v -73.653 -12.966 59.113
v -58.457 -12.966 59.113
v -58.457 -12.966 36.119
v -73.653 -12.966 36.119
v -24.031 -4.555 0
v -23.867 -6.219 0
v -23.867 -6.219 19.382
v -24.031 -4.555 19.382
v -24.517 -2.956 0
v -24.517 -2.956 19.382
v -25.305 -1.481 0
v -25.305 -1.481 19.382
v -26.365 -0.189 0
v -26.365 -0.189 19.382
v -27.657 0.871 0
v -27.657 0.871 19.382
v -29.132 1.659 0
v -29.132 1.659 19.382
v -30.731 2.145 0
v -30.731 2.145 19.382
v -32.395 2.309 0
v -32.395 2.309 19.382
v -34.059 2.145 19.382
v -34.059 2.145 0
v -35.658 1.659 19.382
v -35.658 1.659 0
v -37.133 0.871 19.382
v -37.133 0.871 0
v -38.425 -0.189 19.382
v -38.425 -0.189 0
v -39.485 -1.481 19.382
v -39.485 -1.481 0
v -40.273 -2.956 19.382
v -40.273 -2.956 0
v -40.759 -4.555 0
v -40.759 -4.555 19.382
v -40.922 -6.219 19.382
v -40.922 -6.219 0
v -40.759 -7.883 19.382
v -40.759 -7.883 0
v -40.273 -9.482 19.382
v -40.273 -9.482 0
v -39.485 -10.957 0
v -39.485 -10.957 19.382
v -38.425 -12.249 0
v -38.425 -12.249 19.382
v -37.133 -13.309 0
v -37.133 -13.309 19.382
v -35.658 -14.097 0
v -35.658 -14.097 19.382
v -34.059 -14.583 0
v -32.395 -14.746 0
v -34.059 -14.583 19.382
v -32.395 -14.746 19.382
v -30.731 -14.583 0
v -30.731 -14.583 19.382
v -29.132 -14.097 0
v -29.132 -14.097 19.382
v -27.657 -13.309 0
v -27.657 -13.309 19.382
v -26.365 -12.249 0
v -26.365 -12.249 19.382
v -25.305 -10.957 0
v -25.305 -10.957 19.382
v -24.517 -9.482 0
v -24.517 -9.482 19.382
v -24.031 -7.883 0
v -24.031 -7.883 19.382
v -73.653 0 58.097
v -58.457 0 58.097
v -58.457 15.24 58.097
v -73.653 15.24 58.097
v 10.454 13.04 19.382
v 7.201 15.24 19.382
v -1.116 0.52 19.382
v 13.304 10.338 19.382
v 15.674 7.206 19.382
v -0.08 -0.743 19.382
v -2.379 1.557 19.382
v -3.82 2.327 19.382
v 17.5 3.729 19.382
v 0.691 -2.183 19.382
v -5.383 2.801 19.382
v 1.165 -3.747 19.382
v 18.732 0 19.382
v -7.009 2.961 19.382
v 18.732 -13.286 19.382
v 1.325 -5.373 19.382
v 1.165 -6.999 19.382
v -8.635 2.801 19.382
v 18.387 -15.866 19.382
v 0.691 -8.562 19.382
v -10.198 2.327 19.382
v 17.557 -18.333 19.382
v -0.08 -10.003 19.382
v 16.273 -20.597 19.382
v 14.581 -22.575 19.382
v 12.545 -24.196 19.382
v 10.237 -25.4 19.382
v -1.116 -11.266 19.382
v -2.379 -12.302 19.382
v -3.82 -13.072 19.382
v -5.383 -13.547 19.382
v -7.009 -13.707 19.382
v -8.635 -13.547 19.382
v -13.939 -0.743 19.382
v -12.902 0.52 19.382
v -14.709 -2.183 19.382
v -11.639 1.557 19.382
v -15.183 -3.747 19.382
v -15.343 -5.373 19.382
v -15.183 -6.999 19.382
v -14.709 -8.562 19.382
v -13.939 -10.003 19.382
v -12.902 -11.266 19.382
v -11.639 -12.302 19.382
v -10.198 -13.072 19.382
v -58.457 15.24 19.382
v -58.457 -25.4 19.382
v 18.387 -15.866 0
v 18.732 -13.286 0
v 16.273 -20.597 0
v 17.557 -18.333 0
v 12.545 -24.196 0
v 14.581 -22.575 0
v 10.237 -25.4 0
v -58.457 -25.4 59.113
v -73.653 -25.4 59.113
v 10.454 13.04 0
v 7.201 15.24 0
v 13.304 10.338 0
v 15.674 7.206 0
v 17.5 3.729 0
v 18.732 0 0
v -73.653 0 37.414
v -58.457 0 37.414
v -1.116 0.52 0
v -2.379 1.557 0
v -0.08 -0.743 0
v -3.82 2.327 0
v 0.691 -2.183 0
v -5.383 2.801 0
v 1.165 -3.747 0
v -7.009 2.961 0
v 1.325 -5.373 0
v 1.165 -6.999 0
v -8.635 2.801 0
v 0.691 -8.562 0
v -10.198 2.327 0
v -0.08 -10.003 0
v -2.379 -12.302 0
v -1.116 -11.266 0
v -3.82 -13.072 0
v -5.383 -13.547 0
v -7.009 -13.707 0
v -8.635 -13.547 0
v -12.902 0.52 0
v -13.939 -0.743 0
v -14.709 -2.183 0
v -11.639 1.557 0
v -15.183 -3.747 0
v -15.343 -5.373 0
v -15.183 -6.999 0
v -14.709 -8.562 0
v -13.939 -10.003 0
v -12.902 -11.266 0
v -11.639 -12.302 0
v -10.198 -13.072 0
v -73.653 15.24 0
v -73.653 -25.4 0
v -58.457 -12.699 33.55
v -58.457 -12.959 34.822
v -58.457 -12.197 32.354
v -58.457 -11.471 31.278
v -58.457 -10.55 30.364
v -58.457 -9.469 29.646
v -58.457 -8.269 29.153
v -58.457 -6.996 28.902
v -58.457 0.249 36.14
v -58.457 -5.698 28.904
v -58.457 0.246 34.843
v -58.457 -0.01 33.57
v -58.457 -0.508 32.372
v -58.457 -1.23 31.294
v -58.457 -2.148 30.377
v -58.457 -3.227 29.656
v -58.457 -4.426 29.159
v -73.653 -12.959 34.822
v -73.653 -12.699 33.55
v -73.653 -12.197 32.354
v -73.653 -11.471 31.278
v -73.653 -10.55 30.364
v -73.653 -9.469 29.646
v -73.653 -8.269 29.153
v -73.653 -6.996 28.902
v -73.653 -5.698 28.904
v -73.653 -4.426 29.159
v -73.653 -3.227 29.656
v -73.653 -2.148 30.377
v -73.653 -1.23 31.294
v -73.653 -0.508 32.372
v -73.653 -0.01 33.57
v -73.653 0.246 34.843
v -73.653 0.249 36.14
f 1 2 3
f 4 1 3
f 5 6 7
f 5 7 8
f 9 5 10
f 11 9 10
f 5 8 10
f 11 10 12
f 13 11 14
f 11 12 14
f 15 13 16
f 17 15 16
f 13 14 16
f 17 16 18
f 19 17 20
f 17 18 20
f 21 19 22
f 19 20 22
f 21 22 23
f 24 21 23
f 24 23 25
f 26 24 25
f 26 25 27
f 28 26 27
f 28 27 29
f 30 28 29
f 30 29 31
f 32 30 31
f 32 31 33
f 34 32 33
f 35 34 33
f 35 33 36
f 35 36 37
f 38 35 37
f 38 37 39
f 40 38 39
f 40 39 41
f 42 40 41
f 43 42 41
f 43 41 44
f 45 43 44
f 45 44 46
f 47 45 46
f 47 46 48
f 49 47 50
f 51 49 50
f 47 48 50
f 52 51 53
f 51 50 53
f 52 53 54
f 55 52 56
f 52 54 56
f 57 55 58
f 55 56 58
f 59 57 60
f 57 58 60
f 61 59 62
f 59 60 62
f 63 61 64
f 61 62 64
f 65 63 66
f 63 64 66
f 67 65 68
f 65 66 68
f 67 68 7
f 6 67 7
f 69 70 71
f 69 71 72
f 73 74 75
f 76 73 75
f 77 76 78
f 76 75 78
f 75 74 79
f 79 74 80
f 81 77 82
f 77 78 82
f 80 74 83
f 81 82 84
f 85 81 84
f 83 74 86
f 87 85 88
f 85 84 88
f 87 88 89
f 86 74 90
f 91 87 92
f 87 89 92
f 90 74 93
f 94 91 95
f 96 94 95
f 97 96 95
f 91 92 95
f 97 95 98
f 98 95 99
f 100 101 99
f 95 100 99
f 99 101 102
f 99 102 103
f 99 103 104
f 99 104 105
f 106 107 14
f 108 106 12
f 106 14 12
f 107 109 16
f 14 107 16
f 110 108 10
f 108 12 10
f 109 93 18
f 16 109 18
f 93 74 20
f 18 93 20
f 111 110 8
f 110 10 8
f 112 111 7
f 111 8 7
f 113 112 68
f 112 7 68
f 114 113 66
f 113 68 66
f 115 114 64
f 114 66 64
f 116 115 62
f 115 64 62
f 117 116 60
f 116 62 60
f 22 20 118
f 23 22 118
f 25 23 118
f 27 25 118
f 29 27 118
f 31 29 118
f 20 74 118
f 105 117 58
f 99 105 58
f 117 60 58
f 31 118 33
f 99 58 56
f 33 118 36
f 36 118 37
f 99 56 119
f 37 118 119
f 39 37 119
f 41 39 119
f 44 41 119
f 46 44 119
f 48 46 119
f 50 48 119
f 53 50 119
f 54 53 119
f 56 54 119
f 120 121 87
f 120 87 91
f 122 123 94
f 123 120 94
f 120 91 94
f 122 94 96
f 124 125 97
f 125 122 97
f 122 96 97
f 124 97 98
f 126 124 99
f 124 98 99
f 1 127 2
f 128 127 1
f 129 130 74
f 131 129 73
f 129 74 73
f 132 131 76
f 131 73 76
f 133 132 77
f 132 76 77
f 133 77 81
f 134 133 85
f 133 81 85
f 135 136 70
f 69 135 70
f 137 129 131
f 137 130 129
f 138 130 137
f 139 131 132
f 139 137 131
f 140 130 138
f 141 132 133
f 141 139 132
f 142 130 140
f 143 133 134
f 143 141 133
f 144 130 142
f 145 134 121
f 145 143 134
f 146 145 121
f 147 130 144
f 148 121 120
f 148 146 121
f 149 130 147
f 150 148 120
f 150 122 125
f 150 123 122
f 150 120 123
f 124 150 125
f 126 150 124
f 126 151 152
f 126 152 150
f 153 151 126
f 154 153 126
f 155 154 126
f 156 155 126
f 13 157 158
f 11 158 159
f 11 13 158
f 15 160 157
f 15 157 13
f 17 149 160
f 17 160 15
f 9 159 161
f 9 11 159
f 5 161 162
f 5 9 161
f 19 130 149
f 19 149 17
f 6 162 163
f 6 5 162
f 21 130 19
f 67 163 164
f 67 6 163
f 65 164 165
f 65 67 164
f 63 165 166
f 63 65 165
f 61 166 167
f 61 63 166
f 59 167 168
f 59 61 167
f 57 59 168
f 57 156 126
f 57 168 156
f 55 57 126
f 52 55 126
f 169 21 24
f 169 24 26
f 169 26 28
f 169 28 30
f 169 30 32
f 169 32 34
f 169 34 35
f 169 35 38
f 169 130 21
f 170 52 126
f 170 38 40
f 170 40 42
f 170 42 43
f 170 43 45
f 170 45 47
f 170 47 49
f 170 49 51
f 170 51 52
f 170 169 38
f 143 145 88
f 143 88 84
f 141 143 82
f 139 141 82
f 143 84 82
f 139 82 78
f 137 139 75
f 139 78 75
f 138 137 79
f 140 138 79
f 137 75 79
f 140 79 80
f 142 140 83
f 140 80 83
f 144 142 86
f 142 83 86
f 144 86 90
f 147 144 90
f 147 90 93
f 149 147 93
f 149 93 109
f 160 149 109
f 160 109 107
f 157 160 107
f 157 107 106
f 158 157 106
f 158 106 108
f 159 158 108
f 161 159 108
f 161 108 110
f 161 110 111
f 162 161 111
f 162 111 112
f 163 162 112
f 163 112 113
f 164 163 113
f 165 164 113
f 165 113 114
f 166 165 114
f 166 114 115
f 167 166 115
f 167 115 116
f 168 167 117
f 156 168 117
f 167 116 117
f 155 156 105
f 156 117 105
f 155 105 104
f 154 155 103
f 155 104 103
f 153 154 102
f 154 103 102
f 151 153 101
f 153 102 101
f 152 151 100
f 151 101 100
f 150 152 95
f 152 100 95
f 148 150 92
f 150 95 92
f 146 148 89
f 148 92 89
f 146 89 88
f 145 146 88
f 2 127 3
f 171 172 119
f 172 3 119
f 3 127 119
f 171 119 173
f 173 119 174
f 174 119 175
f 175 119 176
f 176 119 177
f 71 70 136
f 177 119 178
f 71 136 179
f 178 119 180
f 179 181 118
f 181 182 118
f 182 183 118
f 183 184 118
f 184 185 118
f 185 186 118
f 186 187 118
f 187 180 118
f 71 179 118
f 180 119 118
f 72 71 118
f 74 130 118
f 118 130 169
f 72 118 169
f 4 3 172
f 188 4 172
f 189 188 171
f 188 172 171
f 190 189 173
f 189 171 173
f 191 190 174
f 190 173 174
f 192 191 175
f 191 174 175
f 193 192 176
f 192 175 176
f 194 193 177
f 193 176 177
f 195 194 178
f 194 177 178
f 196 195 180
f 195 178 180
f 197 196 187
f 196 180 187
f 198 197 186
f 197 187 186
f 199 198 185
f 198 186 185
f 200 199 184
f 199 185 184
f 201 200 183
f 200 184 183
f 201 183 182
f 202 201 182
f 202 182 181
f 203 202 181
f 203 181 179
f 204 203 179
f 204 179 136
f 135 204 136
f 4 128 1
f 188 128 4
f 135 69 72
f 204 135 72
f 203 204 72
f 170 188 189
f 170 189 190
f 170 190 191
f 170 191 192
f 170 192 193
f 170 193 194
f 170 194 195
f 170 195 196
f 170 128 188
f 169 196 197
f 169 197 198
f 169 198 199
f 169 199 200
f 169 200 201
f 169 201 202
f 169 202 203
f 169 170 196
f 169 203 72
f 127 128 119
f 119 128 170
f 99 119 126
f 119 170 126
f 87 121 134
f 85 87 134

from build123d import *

# Parameters (mm, degrees)
F1_DEPTH  = 25.4
F2_DEPTH  = 15.24
F3_DEPTH  = 25.4
F4_DEPTH  = 10.414
F5_R      = 8.5275246161
F5_R_2    = 8.3340687874
F6_DEPTH  = 25.4
F7_R      = 6.6367792204
F8_DEPTH  = 25.4
F10_DEPTH = 63.246
F12_DEPTH = 25.4
F14_DEPTH = 25.4
F15_DEPTH = 72.644
F16_DEPTH = 3.556
F17_DEPTH = 4.572


with BuildPart() as f1:
    # F0 (on Front) → F1 (new body)
    with BuildSketch(Plane.XZ):
        Polygon((-73.6526176333, 52.2545948625), (-73.6526176333, 0), (-6.6675012931, 0), (-6.6675012931, 19.3822681904), (-58.4569200873, 19.3822681904), (-58.4569200873, 52.2545948625), align=None)
    extrude(amount=F1_DEPTH)

    # F2 (add): a face of the model
    f2_faces = [f1.faces().sort_by_distance(p)[0] for p in [
        (-47.3547272267, 0, 16.950424852),
    ]]
    extrude(f2_faces, amount=F2_DEPTH)

    # F3 (add): a face of the model
    f3_faces = [f1.faces().sort_by_distance(p)[0] for p in [
        (-6.6675012931, -5.08, 9.6911340952),
    ]]
    extrude(f3_faces, amount=F3_DEPTH)

    # F4 (add): a face of the model
    f4_faces = [f1.faces().sort_by_distance(p)[0] for p in [
        (-66.0547688603, -5.08, 52.2545948625),
    ]]
    extrude(f4_faces, amount=F4_DEPTH)

    # F5 (on face) → F6 (cut)
    with BuildSketch(Plane.XY.offset(19.3822681904)):
        with Locations((-32.3949557078, -6.2189701391)):
            Circle(F5_R)
        with Locations((-7.0090550705, -5.3727734512)):
            Circle(F5_R_2)
    extrude(amount=-F6_DEPTH, mode=Mode.SUBTRACT)

    # F7 (on face) → F8 (cut)
    with BuildSketch(Plane.YZ.offset(-58.4569200873)):
        with Locations((-6.3573834486, 35.5083160102)):
            Circle(F7_R)
    extrude(amount=-F8_DEPTH, mode=Mode.SUBTRACT)

    # F9 (on face) → F10 (cut)
    with BuildSketch(Plane.YZ.offset(-58.4569200873)):
        with BuildLine():
            Line((-12.9659945775, 62.6685948625), (-12.9659945775, 36.1191329772))
            ThreePointArc((-12.9659945775, 36.1191329772), (-7.0167461638, 42.1122602279), (0, 37.4137068119))
            Line((0, 37.4137068119), (0, 62.6685948625))
            Line((0, 62.6685948625), (-12.9659945775, 62.6685948625))
        make_face()
    extrude(amount=-F10_DEPTH, mode=Mode.SUBTRACT)

    # F11 (on face) → F12 (join)
    with BuildSketch(Plane.XY.offset(19.3822681904)):
        with BuildLine():
            ThreePointArc((18.7324987069, -13.2857691497), (16.2726896365, -20.59670587), (10.2370602665, -25.4))
            Line((10.2370602665, -25.4), (18.7324987069, -25.4))
            Line((18.7324987069, -25.4), (18.7324987069, -13.2857691497))
        make_face()
    extrude(amount=F12_DEPTH)

    # F13 (on face) → F14 (cut)
    with BuildSketch(Plane.XY.offset(19.3822681904)):
        with BuildLine():
            ThreePointArc((7.2008380666, 15.24), (14.5531964002, 8.8204791763), (18.7324987069, 0))
            Line((18.7324987069, 0), (18.7324987069, 15.24))
            Line((18.7324987069, 15.24), (7.2008380666, 15.24))
        make_face()
    extrude(amount=-F14_DEPTH, mode=Mode.SUBTRACT)

    # F15 (cut): a face of the model
    f15_faces = [f1.faces().sort_by_distance(p)[0] for p in [
        (16.4165308131, -22.484618829, 44.7822681904),
    ]]
    extrude(f15_faces, amount=-F15_DEPTH, mode=Mode.SUBTRACT)

    # F16 (cut): a face of the model
    f16_faces = [f1.faces().sort_by_distance(p)[0] for p in [
        (-66.0547688603, -19.1829972888, 62.6685948625),
    ]]
    extrude(f16_faces, amount=-F16_DEPTH, mode=Mode.SUBTRACT)

    # F17 (cut): a face of the model
    f17_faces = [f1.faces().sort_by_distance(p)[0] for p in [
        (-66.0547688603, 7.62, 62.6685948625),
    ]]
    extrude(f17_faces, amount=-F17_DEPTH, mode=Mode.SUBTRACT)


solid = f1.part
